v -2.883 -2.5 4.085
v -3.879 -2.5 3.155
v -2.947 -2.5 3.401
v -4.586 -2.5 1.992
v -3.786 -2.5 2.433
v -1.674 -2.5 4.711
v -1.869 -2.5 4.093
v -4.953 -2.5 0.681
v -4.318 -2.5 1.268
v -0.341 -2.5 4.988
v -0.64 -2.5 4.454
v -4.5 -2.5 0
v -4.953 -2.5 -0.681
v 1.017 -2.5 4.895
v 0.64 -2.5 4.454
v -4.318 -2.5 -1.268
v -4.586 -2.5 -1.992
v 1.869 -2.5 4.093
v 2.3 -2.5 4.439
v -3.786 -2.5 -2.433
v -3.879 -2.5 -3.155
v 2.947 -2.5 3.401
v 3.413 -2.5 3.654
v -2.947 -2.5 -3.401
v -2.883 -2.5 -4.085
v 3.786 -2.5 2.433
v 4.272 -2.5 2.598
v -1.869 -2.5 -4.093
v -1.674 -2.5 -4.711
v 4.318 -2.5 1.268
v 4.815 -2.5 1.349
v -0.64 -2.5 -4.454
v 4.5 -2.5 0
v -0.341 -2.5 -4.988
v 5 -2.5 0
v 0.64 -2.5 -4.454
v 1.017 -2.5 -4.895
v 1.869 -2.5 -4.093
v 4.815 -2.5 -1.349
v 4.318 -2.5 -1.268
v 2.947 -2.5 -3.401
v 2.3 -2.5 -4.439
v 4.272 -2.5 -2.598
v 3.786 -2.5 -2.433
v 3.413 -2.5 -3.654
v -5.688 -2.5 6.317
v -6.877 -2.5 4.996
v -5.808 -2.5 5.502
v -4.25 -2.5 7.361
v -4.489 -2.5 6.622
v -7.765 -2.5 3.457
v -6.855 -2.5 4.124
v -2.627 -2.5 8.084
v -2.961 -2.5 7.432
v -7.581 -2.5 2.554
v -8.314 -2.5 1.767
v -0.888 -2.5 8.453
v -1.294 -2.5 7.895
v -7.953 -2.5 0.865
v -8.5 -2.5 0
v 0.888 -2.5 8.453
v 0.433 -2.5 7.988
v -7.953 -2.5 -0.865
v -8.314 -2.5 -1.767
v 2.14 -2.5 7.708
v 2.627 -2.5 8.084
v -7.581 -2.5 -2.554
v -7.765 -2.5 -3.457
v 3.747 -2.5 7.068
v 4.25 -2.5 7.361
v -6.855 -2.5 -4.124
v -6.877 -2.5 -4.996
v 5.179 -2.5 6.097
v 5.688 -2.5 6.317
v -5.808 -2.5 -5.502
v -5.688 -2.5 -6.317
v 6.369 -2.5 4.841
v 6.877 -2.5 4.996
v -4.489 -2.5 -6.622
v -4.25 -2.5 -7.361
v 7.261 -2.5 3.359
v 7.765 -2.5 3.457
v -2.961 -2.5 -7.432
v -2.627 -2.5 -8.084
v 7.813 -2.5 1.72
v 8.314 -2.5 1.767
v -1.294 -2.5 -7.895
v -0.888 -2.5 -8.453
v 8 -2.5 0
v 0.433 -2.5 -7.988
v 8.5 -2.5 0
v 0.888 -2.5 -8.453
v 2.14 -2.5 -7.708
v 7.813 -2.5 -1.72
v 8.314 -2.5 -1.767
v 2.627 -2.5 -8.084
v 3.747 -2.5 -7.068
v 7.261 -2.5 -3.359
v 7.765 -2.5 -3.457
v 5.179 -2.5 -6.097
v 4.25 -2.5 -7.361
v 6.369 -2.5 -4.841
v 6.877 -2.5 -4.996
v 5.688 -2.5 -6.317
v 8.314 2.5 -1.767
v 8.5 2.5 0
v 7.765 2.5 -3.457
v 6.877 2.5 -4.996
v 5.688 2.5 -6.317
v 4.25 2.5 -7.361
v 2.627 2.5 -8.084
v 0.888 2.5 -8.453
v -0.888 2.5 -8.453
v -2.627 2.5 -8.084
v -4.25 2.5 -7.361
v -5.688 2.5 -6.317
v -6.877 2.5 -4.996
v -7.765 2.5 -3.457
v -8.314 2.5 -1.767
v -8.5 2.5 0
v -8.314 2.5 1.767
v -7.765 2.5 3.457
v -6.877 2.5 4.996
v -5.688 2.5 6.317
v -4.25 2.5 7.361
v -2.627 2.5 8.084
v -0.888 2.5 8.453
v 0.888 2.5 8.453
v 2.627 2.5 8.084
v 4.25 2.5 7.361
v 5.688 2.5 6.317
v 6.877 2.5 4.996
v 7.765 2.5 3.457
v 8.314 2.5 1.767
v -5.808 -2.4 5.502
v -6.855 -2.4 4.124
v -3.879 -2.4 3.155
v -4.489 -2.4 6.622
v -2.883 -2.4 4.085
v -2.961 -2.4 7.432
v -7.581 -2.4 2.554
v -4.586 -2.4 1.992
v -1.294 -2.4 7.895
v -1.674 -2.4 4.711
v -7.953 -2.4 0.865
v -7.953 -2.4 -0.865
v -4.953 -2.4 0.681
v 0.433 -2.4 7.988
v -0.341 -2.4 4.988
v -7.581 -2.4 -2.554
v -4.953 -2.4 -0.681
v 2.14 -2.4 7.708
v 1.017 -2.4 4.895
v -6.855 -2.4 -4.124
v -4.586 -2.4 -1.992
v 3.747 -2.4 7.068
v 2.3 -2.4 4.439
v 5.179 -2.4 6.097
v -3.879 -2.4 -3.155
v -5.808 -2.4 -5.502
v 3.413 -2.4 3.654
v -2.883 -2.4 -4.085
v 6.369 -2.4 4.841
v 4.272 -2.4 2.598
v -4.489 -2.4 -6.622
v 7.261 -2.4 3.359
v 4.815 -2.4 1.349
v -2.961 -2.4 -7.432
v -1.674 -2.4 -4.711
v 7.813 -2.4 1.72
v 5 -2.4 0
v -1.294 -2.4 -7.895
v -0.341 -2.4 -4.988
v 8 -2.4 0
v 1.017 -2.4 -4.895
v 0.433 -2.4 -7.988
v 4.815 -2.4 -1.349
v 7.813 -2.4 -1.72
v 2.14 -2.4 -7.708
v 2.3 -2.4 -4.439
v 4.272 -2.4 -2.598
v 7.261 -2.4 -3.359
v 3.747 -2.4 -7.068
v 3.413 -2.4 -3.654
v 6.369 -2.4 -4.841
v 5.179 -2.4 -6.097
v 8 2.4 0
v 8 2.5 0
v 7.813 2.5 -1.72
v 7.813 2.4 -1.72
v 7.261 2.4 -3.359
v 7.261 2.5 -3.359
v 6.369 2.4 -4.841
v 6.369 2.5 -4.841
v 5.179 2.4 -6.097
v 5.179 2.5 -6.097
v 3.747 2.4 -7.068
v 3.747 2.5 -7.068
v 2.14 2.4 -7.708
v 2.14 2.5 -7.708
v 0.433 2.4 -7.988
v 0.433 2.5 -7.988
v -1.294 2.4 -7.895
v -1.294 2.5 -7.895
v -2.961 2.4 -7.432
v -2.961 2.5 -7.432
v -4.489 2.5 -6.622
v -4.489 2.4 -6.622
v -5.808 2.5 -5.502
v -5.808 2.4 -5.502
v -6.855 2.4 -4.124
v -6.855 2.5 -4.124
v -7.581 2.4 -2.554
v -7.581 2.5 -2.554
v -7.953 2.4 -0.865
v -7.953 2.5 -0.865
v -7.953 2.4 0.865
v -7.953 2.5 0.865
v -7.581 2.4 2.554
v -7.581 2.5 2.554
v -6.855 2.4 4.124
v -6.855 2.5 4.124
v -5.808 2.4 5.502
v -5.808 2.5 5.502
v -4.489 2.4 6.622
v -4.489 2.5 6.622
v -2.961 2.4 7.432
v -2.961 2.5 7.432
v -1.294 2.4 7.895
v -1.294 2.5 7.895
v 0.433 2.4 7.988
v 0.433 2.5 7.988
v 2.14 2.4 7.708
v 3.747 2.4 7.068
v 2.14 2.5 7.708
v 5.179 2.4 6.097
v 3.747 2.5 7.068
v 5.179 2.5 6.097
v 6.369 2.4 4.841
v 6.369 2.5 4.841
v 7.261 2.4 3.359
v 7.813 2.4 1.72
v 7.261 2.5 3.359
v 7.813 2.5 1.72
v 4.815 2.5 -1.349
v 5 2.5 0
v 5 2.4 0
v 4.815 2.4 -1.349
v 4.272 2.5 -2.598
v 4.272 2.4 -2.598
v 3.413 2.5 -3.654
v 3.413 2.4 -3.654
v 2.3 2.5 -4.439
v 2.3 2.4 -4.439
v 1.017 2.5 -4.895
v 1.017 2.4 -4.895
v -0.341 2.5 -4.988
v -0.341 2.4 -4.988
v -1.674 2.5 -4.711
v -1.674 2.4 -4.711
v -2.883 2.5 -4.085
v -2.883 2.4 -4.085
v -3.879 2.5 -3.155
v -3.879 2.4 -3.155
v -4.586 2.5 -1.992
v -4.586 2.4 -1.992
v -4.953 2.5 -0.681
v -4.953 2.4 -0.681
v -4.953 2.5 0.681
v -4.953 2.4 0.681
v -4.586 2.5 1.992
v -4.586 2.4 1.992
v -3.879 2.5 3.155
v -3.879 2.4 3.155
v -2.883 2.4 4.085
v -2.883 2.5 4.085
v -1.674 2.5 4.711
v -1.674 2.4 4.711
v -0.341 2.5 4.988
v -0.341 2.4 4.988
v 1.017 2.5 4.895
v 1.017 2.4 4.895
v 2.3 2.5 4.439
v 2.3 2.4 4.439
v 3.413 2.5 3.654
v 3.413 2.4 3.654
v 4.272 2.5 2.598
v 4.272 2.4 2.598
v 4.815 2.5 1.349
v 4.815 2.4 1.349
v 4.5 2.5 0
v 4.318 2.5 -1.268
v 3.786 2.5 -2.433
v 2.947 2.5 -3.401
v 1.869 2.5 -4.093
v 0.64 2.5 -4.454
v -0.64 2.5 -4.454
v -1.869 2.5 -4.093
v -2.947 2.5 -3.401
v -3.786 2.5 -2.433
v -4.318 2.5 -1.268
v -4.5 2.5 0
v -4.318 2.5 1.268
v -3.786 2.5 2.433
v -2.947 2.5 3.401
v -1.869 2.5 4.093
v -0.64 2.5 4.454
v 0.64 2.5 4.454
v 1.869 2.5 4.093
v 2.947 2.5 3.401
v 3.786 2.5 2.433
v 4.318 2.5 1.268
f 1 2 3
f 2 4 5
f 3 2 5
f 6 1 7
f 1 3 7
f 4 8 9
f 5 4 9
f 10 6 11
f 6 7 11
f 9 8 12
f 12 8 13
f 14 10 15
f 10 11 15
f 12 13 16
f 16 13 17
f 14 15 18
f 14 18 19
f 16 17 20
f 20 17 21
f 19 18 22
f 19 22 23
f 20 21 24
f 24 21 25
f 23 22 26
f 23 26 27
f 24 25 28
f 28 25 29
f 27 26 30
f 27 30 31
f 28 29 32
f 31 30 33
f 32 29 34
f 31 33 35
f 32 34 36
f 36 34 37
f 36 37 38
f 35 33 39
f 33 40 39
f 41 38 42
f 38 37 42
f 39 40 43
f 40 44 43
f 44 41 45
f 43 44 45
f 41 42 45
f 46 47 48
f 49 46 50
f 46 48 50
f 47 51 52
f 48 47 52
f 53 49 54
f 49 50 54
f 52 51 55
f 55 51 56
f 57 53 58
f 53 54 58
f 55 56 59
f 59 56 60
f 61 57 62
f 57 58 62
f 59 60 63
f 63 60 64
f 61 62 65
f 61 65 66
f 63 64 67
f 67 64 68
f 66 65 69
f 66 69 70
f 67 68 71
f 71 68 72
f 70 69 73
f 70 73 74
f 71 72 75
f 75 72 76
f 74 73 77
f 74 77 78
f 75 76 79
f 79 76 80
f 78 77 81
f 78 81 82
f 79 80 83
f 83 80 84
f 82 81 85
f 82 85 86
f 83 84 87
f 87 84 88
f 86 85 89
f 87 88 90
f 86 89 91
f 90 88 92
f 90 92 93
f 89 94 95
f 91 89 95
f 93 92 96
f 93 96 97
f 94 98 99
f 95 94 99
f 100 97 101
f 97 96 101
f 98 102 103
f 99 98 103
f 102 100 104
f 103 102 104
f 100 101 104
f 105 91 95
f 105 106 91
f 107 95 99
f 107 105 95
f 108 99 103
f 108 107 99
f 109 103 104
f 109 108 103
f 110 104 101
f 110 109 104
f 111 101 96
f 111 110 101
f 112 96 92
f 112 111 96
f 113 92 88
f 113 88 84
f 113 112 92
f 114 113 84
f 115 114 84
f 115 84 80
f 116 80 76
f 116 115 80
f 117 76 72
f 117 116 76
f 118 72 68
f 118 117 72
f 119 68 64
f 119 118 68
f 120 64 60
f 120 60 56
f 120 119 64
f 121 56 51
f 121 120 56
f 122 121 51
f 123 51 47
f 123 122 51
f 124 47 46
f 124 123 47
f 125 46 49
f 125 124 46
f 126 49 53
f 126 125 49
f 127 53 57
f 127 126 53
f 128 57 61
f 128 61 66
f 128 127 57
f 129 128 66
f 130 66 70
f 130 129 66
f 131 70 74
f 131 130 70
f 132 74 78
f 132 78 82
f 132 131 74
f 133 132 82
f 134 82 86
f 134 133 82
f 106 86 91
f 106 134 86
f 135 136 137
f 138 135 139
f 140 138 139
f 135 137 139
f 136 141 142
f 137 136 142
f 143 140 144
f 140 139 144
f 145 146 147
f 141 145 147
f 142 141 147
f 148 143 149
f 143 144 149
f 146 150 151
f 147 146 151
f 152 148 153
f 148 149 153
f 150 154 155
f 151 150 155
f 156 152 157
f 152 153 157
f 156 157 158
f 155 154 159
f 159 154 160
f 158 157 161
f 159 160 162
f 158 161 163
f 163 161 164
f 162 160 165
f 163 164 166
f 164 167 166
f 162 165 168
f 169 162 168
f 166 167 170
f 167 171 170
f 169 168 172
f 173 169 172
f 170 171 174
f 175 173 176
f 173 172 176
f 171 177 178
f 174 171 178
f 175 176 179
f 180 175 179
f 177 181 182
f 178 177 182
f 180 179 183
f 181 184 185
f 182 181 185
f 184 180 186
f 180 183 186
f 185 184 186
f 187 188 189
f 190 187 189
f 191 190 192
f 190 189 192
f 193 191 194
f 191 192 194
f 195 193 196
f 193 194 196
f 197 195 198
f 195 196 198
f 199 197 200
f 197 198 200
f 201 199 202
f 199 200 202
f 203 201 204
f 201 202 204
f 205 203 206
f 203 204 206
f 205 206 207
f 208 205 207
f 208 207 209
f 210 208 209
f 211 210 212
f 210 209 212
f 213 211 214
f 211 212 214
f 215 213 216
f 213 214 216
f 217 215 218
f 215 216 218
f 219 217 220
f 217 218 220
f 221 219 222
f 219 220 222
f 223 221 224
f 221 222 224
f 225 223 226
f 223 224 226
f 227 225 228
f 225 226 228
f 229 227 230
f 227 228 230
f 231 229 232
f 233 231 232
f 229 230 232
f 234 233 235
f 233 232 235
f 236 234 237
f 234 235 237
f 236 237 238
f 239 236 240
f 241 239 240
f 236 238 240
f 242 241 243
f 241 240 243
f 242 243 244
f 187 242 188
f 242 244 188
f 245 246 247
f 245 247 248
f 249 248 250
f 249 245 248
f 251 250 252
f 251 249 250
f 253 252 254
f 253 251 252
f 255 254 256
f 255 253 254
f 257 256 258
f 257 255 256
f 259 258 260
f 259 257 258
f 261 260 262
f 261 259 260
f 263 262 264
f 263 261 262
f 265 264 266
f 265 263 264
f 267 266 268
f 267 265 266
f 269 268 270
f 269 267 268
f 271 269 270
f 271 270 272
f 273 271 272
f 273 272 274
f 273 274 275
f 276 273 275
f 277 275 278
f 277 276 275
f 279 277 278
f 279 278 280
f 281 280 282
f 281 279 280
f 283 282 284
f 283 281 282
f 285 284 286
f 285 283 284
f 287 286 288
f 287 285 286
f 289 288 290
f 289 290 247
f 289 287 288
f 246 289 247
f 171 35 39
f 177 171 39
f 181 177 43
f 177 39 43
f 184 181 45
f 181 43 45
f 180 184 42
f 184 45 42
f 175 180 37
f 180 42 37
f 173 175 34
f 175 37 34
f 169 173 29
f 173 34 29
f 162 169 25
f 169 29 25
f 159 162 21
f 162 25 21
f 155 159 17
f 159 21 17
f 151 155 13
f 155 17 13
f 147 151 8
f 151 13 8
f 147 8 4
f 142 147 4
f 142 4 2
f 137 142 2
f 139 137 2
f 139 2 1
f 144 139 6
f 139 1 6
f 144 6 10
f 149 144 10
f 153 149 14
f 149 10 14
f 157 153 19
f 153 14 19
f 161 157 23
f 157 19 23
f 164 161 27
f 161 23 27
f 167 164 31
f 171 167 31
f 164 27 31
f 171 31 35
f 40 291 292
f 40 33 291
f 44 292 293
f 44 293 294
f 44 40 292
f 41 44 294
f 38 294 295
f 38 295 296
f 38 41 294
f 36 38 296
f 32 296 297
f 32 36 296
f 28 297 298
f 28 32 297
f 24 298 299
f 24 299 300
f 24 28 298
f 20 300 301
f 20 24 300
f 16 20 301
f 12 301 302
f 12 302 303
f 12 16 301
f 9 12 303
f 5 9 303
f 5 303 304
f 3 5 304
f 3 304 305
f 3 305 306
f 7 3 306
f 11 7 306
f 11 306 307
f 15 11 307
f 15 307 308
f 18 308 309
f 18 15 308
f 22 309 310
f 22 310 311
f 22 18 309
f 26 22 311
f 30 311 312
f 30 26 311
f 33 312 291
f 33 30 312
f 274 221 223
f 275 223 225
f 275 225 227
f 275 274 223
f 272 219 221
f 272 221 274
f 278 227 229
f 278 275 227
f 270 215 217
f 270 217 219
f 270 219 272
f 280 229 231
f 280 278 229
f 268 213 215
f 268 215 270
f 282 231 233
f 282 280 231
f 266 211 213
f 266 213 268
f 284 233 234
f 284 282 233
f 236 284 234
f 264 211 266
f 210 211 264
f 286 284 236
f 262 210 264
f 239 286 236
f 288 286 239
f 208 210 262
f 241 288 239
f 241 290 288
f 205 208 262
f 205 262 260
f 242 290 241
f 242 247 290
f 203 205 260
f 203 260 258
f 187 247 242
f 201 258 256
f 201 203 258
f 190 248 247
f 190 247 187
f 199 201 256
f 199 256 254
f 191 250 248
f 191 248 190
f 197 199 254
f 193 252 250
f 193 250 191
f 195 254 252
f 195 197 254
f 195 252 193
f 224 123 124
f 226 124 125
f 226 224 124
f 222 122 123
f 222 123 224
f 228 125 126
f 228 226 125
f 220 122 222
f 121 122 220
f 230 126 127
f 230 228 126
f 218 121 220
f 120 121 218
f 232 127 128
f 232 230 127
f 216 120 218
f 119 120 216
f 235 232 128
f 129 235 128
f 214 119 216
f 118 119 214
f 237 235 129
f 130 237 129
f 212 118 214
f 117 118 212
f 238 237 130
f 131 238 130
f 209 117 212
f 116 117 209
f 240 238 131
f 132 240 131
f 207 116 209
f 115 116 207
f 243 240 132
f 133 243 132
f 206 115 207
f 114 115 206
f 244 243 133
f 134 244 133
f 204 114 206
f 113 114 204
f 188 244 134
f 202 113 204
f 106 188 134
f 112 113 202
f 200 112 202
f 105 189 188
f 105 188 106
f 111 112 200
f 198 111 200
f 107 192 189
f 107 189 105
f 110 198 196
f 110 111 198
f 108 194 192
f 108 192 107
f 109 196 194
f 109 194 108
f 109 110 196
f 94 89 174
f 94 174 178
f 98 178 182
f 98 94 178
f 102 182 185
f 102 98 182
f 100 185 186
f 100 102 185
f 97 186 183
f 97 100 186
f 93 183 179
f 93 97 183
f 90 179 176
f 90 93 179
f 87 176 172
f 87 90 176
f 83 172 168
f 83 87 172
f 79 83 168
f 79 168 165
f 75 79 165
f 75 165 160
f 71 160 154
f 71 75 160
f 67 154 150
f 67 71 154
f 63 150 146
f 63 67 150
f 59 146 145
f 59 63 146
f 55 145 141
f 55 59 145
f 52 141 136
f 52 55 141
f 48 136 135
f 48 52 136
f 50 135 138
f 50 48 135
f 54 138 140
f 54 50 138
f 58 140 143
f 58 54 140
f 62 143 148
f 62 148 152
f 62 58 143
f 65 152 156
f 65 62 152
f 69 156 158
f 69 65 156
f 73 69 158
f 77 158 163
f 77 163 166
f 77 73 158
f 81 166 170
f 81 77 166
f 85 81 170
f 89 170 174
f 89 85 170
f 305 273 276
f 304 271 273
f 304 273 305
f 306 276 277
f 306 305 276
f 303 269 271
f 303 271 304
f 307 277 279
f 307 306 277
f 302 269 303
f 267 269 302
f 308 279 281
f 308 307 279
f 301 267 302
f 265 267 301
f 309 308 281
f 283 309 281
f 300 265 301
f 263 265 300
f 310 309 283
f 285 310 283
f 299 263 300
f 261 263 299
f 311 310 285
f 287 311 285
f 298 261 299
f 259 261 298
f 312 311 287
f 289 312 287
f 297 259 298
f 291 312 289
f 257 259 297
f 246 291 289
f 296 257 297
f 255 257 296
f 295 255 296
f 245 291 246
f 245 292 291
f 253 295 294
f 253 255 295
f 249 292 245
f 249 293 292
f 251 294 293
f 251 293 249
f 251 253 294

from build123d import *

# Parameters (mm, degrees)
SKETCH1_R           = 8.5
SKETCH1_R_2         = 4.5
BOSS_EXTRUDE1_DEPTH = 2.5
SKETCH2_R           = 8
SKETCH2_R_2         = 5
CUT_EXTRUDE1_DEPTH  = 0.1


with BuildPart() as part:
    # Sketch1 → Boss-Extrude1 (new body, symmetric)
    with BuildSketch(Plane(origin=(0, 0, 0), x_dir=(1, 0, 0), z_dir=(0, 1, 0))):
        Circle(SKETCH1_R)
        Circle(SKETCH1_R_2, mode=Mode.SUBTRACT)
    extrude(amount=BOSS_EXTRUDE1_DEPTH, both=True)

    # Sketch2 → Cut-Extrude1 (cut)
    with BuildSketch(Plane(origin=(0, 2.5, 0), x_dir=(1, 0, 0), z_dir=(0, 1, 0))):
        Circle(SKETCH2_R)
        Circle(SKETCH2_R_2, mode=Mode.SUBTRACT)
    cut_extrude1 = extrude(amount=-CUT_EXTRUDE1_DEPTH, mode=Mode.SUBTRACT)

    # Mirror1: Cut-Extrude1 across plane
    add(cut_extrude1.mirror(Plane.ZX), mode=Mode.SUBTRACT)


solid = part.part
